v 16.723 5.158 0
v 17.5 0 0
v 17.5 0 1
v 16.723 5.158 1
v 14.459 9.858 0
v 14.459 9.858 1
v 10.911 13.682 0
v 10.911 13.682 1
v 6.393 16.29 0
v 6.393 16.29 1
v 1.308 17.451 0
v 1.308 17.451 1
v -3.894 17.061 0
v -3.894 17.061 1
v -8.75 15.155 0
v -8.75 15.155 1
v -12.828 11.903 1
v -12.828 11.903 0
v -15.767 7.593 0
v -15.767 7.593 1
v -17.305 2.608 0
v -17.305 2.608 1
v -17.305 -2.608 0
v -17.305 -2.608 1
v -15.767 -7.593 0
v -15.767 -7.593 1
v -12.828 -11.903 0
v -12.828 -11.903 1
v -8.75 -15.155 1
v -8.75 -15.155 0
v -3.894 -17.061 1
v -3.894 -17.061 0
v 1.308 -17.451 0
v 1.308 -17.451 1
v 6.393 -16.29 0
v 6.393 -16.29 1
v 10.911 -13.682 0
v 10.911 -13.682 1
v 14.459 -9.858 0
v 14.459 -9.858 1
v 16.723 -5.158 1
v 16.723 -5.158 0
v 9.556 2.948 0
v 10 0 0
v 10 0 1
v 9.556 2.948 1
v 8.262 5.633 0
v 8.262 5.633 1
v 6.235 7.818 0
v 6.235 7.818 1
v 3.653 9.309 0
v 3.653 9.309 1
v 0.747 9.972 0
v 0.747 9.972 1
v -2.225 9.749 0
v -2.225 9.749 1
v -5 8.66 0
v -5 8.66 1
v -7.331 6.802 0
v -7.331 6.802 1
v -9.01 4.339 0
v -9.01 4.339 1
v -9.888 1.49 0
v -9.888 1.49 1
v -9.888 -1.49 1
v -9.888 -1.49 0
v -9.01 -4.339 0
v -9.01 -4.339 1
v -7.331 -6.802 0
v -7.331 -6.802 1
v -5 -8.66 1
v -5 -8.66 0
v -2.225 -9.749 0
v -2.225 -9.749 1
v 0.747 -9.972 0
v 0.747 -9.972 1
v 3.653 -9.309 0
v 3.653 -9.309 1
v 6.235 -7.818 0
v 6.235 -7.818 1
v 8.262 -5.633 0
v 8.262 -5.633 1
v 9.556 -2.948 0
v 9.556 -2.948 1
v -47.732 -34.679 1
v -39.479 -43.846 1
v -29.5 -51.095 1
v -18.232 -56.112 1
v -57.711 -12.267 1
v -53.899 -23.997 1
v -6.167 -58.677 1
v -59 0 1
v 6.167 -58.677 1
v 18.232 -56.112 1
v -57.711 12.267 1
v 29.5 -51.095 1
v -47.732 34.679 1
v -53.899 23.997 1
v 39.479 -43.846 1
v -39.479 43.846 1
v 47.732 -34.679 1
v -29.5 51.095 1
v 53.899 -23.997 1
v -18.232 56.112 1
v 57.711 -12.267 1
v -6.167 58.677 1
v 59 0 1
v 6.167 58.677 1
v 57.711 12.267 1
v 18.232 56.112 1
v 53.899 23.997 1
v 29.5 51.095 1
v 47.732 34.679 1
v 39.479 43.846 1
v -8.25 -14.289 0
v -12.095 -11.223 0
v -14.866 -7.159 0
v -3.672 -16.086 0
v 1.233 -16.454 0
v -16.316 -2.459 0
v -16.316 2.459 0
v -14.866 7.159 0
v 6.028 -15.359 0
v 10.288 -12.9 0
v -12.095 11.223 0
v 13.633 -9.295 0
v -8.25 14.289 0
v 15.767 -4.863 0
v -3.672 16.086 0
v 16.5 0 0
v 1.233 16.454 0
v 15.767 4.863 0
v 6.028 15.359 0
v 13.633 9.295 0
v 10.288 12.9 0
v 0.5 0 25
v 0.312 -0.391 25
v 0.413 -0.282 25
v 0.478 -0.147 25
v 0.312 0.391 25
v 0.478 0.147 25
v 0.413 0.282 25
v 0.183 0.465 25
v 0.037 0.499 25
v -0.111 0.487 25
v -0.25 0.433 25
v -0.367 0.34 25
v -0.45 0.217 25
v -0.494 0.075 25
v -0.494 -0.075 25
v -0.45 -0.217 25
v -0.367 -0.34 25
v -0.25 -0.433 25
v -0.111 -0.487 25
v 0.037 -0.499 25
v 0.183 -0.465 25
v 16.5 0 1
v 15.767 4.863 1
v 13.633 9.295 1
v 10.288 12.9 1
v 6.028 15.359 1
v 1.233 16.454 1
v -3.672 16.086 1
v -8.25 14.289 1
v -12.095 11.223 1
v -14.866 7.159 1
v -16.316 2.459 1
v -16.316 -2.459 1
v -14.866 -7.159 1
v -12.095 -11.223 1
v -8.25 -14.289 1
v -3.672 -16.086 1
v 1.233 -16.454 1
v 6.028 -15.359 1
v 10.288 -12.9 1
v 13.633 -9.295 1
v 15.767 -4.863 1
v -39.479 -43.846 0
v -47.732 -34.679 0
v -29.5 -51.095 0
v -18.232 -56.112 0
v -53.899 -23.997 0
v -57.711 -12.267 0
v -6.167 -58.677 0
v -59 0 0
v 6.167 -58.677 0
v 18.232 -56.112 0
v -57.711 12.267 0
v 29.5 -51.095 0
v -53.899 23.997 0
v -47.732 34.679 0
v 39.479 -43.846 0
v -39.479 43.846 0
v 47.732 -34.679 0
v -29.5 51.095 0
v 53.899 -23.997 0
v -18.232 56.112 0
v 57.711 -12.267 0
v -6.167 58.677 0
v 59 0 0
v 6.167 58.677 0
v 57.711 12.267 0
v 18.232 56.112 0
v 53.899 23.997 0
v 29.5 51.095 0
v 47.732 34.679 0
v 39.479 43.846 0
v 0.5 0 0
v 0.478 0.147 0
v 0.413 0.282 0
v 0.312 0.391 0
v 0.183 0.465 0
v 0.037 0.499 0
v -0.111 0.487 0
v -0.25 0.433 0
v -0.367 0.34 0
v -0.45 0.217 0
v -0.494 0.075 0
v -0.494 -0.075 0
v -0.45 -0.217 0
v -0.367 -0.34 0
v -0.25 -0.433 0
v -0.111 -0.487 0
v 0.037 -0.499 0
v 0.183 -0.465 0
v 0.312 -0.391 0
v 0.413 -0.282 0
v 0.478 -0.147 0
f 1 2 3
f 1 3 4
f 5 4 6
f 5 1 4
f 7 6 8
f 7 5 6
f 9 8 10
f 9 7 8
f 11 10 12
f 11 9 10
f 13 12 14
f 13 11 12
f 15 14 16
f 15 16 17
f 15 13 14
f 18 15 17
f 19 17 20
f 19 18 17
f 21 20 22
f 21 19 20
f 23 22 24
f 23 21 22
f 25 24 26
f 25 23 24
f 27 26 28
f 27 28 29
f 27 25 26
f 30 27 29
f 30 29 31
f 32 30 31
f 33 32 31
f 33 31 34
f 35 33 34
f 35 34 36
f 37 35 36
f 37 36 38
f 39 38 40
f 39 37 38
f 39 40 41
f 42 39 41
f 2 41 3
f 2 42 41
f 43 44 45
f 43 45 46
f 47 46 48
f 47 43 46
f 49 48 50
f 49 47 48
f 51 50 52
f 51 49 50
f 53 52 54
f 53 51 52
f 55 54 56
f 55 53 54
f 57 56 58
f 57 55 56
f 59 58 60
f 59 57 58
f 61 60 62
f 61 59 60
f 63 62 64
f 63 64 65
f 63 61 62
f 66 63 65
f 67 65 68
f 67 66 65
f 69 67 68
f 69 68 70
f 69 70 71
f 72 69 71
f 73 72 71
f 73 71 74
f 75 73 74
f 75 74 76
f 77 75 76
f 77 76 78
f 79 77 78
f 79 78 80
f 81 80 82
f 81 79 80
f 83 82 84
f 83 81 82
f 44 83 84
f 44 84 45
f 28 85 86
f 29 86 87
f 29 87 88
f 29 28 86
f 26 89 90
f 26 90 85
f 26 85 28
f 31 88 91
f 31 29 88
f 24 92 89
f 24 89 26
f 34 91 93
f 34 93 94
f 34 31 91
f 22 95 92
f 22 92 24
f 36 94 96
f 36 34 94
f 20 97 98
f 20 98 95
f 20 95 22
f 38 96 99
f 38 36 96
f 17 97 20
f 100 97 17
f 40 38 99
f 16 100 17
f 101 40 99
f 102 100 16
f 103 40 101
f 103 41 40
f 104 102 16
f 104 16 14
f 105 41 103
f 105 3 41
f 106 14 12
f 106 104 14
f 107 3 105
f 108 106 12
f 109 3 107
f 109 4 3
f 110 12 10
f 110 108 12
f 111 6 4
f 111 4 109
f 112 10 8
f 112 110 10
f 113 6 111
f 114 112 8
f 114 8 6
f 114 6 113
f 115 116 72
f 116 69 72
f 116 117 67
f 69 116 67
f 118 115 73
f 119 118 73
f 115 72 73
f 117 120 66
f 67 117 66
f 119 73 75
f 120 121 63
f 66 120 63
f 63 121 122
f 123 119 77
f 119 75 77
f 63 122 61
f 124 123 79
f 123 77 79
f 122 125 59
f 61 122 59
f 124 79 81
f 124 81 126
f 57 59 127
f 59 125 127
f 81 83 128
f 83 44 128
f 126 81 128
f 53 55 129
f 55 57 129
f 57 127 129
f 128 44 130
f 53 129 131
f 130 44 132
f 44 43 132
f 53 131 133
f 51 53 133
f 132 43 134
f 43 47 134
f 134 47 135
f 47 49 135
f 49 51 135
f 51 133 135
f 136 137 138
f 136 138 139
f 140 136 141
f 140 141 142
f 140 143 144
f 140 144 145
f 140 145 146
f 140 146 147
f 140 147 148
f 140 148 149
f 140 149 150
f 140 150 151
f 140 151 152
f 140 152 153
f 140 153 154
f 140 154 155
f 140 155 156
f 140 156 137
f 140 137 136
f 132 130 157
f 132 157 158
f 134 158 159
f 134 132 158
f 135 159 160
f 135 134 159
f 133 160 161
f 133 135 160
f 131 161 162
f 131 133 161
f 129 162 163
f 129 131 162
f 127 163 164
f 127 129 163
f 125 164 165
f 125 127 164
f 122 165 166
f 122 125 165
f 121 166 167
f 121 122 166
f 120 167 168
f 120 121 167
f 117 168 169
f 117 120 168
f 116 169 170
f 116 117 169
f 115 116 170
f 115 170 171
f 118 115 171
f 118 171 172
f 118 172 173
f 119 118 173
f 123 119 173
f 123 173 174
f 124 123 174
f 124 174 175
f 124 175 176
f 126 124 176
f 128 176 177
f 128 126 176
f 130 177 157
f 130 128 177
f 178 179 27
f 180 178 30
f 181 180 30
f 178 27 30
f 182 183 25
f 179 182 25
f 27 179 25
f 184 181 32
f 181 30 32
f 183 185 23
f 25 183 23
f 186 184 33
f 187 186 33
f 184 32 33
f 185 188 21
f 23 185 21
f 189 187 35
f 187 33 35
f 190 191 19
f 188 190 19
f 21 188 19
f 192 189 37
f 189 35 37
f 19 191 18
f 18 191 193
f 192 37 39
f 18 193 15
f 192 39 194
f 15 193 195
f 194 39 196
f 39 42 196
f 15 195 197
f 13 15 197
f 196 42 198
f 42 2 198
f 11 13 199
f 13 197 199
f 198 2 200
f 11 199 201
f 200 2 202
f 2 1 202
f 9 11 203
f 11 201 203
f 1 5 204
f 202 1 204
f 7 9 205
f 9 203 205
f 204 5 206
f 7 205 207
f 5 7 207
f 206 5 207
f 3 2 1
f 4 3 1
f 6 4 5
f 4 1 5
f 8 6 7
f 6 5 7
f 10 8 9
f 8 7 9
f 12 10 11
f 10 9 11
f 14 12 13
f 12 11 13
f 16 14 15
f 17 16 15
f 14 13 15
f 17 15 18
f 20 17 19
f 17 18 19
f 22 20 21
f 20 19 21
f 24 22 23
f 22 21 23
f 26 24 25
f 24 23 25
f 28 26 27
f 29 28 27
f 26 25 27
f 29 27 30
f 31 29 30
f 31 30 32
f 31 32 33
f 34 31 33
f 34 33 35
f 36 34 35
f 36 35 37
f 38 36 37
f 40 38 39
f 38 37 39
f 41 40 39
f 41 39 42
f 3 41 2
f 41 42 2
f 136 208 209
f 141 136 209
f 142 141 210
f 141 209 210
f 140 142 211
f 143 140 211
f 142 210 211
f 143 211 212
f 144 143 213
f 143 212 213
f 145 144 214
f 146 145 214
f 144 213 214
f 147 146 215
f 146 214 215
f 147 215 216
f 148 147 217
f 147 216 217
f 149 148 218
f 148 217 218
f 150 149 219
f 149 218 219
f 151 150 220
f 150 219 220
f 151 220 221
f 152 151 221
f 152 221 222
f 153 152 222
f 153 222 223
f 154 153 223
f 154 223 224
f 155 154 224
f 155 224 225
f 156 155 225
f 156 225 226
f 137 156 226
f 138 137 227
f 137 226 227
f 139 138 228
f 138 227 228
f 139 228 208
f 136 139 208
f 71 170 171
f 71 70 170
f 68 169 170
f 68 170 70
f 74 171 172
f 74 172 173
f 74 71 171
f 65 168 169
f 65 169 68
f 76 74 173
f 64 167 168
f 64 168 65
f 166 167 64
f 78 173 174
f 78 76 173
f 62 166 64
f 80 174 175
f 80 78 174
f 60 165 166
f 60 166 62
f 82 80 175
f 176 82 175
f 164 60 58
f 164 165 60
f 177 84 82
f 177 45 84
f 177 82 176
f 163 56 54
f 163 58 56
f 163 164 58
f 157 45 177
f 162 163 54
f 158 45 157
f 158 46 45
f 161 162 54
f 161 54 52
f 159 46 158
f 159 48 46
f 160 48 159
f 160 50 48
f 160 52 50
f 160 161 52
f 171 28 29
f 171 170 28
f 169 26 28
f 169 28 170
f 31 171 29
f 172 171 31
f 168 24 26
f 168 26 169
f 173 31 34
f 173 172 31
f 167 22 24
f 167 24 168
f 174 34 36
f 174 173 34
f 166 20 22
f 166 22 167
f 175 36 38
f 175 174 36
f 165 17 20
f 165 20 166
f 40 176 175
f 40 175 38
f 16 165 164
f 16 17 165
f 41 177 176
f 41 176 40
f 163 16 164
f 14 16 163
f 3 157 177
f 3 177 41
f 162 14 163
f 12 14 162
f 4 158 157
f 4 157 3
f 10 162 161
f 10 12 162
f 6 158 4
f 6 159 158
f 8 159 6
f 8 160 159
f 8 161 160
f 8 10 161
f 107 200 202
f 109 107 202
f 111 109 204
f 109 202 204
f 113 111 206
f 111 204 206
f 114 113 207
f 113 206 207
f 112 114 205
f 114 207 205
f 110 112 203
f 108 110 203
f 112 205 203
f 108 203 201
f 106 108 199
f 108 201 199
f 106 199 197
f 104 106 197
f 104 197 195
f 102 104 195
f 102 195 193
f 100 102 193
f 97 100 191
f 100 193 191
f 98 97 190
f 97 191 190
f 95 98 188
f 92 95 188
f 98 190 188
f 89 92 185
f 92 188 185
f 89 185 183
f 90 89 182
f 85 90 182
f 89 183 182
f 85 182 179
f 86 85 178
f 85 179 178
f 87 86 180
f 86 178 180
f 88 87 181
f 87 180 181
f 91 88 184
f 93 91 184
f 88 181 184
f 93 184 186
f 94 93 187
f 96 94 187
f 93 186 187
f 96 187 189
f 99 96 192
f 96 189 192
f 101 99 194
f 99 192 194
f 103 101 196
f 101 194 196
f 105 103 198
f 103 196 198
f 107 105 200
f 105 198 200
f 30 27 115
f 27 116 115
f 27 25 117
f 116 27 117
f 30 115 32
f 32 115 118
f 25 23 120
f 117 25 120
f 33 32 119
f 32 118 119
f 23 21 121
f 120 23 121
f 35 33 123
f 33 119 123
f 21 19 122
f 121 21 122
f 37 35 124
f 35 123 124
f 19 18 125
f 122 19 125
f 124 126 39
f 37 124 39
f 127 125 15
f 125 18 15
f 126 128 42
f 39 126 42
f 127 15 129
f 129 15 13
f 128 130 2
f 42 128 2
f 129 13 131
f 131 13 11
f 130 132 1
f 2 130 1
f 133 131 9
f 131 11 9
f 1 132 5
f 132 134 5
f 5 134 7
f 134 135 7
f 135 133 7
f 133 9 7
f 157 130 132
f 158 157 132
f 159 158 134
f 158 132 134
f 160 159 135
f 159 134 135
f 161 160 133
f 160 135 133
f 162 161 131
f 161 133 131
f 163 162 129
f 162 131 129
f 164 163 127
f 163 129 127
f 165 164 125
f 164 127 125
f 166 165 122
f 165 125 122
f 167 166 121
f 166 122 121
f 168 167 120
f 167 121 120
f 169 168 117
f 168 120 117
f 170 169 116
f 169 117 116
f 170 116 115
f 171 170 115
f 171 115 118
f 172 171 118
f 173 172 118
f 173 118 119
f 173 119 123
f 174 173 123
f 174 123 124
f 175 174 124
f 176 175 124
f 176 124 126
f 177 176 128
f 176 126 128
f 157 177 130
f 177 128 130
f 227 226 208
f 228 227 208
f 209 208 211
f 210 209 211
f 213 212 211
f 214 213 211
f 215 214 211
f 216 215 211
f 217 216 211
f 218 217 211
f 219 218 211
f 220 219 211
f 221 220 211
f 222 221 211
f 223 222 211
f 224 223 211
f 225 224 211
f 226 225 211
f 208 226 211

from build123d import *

# Parameters (mm, degrees)
F0_R     = 59
F0_R_2   = 17.5
F1_DEPTH = 1
F2_R     = 0.5
F3_DEPTH = 25
F0_R_3   = 16.5
F0_R_4   = 10
F4_DEPTH = 1
F5_DEPTH = 1


with BuildPart() as f1:
    # F0 (on Top) → F1 (new body)
    with BuildSketch(Plane.XY):
        Circle(F0_R)
        Circle(F0_R_2, mode=Mode.SUBTRACT)
    extrude(amount=F1_DEPTH)


with BuildPart() as f3:
    # F2 (on Top) → F3 (new body)
    with BuildSketch(Plane.XY):
        Circle(F2_R)
    extrude(amount=F3_DEPTH)


with BuildPart() as f4:
    # F0 (on Top) → F4 (new body)
    with BuildSketch(Plane.XY):
        Circle(F0_R_3)
        Circle(F0_R_4, mode=Mode.SUBTRACT)
    extrude(amount=F4_DEPTH)


with BuildPart() as f5:
    # F0 (on Top) → F5 (new body)
    with BuildSketch(Plane.XY):
        Circle(F0_R_2)
        Circle(F0_R_3, mode=Mode.SUBTRACT)
    extrude(amount=F5_DEPTH)


solid = Compound([f1.part, f3.part, f4.part, f5.part])
